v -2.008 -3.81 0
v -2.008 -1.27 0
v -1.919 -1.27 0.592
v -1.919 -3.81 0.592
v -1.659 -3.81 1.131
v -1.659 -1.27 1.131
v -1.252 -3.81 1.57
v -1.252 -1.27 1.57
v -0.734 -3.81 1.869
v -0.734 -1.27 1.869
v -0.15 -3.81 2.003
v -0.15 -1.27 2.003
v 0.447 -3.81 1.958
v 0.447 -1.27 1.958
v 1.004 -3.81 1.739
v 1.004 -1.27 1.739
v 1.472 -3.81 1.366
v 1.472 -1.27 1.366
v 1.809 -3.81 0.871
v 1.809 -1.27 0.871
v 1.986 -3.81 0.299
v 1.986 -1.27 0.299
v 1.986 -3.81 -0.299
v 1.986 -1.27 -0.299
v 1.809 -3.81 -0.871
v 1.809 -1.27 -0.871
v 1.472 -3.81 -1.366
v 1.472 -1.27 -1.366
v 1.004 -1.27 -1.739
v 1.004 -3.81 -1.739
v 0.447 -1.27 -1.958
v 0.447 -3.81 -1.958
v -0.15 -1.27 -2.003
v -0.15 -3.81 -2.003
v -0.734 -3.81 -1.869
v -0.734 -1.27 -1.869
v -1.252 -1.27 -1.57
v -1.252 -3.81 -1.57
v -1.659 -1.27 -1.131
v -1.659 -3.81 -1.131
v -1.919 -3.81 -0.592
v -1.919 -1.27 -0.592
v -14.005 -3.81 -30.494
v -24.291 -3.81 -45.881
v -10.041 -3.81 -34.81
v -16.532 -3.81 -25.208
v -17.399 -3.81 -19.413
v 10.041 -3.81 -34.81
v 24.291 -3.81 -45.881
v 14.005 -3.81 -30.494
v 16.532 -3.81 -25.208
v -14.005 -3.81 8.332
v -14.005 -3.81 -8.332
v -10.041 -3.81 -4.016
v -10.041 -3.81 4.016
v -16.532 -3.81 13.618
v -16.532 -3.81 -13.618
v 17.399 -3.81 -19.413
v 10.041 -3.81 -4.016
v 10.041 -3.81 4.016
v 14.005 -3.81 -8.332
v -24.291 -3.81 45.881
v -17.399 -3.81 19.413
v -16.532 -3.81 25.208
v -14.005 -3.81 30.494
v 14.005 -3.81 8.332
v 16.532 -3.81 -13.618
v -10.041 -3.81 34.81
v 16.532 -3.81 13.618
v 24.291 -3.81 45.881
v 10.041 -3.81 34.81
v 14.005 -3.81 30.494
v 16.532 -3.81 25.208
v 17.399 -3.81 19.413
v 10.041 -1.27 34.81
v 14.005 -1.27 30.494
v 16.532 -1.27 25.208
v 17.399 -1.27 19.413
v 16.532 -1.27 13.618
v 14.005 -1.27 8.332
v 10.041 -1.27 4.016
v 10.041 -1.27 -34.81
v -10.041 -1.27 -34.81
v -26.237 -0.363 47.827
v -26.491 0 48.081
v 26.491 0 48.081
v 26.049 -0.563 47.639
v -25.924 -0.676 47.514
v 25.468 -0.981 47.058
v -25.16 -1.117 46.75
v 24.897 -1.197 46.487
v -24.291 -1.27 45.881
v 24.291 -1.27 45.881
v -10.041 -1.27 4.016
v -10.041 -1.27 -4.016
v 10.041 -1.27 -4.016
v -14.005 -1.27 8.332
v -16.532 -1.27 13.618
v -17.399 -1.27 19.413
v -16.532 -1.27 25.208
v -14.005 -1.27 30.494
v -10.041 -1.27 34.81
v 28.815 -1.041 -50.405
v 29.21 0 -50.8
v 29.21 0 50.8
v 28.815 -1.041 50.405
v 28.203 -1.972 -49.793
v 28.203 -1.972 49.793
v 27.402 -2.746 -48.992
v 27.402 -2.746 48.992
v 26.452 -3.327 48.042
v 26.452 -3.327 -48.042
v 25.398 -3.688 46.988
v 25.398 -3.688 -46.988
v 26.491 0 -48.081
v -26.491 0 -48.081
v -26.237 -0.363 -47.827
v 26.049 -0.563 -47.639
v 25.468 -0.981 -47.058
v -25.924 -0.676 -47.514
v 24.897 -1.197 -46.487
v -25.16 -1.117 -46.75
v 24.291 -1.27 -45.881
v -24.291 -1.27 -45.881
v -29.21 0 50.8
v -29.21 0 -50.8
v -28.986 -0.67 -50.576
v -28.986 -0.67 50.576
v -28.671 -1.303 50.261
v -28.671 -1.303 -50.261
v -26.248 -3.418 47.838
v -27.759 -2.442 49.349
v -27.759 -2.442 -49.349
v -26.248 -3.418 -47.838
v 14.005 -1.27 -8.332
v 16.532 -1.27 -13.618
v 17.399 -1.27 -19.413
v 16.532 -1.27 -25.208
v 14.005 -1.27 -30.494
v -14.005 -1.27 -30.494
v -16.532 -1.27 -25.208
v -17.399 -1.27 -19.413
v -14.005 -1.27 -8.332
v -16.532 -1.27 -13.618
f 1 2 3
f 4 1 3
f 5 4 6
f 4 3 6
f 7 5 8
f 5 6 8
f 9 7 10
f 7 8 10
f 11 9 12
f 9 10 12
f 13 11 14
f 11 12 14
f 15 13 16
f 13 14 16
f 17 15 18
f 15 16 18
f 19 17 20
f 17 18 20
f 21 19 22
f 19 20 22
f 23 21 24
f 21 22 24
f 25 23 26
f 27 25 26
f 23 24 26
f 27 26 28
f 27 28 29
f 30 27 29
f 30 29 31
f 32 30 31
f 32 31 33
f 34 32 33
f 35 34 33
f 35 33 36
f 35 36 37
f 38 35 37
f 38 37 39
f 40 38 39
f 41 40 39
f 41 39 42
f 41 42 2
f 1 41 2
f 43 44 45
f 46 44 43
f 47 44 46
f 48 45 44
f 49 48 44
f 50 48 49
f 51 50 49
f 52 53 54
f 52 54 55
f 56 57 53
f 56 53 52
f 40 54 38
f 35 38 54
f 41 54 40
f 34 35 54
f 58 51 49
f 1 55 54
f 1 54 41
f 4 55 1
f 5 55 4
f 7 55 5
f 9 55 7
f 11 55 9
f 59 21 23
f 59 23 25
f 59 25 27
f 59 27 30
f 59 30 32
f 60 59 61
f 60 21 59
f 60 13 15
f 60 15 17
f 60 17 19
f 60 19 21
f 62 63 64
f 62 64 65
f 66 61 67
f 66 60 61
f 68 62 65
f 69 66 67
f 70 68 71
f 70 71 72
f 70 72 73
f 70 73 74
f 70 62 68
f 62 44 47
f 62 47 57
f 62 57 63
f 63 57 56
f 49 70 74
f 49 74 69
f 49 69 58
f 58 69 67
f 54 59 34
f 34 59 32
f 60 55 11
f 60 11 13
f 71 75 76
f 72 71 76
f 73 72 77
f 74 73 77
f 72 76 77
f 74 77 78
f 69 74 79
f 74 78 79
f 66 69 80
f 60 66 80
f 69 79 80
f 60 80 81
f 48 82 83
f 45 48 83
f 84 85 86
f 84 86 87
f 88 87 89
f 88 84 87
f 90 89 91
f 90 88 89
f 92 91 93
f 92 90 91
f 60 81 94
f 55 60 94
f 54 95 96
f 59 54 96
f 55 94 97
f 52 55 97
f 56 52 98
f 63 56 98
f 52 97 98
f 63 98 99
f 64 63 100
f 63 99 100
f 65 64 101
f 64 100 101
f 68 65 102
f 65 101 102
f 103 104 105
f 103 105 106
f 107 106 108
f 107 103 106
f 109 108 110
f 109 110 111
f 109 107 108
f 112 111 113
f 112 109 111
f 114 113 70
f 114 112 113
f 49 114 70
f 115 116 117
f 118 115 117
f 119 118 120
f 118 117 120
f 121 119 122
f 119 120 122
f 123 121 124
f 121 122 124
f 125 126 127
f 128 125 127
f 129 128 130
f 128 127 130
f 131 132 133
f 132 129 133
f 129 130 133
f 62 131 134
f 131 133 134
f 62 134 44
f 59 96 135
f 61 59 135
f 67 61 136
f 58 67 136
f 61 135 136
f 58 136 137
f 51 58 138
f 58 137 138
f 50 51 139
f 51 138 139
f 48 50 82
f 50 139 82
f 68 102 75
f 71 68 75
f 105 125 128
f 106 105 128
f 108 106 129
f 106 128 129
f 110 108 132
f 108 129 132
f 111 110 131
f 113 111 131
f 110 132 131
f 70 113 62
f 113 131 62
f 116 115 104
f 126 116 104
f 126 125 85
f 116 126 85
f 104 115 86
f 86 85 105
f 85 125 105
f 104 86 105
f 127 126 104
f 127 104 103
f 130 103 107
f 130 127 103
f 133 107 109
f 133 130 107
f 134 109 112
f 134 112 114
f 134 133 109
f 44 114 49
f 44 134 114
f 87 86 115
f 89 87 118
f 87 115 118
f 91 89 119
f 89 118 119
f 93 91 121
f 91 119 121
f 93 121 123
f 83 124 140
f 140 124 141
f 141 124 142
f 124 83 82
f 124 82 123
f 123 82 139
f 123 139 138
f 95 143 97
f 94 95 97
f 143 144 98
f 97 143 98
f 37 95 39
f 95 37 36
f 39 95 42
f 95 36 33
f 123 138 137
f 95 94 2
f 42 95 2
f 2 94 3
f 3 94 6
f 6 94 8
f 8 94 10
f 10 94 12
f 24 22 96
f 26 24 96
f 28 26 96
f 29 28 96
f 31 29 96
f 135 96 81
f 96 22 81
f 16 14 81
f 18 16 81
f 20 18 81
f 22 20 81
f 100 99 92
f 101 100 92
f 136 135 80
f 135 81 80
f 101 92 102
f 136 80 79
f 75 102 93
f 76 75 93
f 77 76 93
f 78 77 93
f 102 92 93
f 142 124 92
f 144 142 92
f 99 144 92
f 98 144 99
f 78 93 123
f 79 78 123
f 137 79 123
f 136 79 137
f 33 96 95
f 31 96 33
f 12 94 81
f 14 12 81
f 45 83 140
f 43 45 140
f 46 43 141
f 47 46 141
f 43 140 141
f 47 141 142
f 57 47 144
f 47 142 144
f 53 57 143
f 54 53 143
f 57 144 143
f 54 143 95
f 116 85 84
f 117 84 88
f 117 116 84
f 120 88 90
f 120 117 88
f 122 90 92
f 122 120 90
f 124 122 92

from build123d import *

# Parameters (mm, degrees)
F0_W        = 58.42
F0_H        = 101.6
F1_DEPTH    = 3.81
F2_T1_DEPTH = 126.1934442484
F2_T3_DEPTH = 83.0134442484
F4_T        = -2.54
F3_R        = 2.0082426315
F5_DEPTH    = 25.4


# Not quite as in the source:
# - a fillet or chamfer that OpenCascade refuses, or shapes differently, is made with other operations: its cross-section is extruded or revolved along the edge and cut away or added


with BuildPart() as f1:
    # F0 (on Front) → F1 (new body)
    with BuildSketch(Plane.XZ):
        Rectangle(F0_W, F0_H)
    extrude(amount=F1_DEPTH)

    # F2: fillet of radius 5.08 on 4 edges, made by hand

    # F2_s2 → F2_t1 (cut)
    with BuildSketch(Plane.XY.offset(-63.0967221242)):
        with BuildLine():
            ThreePointArc((-29.21, 0), (-27.4021631237, -2.7460926284), (-24.2913111503, -3.81))
            Line((-24.2913111503, -3.81), (-24.2913111503, -3.9116))
            Line((-24.2913111503, -3.9116), (-29.21, -3.9116))
            Line((-29.21, -3.9116), (-29.3116, -3.81))
            ThreePointArc((-29.3116, -3.81), (-29.3116, -1.905), (-29.308373777, -0.0254))
            Line((-29.308373777, -0.0254), (-29.21, 0))
        make_face()
        with BuildLine():
            ThreePointArc((29.21, 0), (27.4021631237, -2.7460926284), (24.2913111503, -3.81))
            Line((24.2913111503, -3.81), (24.2913111503, -3.9116))
            Line((24.2913111503, -3.9116), (29.21, -3.9116))
            Line((29.21, -3.9116), (29.3116, -3.81))
            ThreePointArc((29.3116, -3.81), (29.3116, -1.905), (29.308373777, -0.0254))
            Line((29.308373777, -0.0254), (29.21, 0))
        make_face()
    extrude(amount=F2_T1_DEPTH, mode=Mode.SUBTRACT)

    # F2_s4 → F2_t3 (cut)
    with BuildSketch(Plane.YZ.offset(-41.5067221242)):
        with BuildLine():
            ThreePointArc((0, 50.8), (-2.7460926284, 48.9921631237), (-3.81, 45.8813111503))
            Line((-3.81, 45.8813111503), (-3.9116, 45.8813111503))
            Line((-3.9116, 45.8813111503), (-3.9116, 50.8))
            Line((-3.9116, 50.8), (-3.81, 50.9016))
            ThreePointArc((-3.81, 50.9016), (-1.905, 50.9016), (-0.0254, 50.898373777))
            Line((-0.0254, 50.898373777), (0, 50.8))
        make_face()
        with BuildLine():
            ThreePointArc((0, -50.8), (-2.7460926284, -48.9921631237), (-3.81, -45.8813111503))
            Line((-3.81, -45.8813111503), (-3.9116, -45.8813111503))
            Line((-3.9116, -45.8813111503), (-3.9116, -50.8))
            Line((-3.9116, -50.8), (-3.81, -50.9016))
            ThreePointArc((-3.81, -50.9016), (-1.905, -50.9016), (-0.0254, -50.898373777))
            Line((-0.0254, -50.898373777), (0, -50.8))
        make_face()
    extrude(amount=F2_T3_DEPTH, mode=Mode.SUBTRACT)

    # F4
    f4_openings = [f1.faces().sort_by_distance(p)[0] for p in [
        (0, 0, 0),
    ]]
    offset(amount=F4_T, openings=f4_openings)

    # F3 (on face) → F5 (cut)
    with BuildSketch(Plane(origin=(0, 0, 0), x_dir=(-1, 0, 0), z_dir=(0, 1, 0))):
        with BuildLine():
            Line((10.0412131573, 34.8095389452), (-10.0412131573, 34.8095389452))
            ThreePointArc((-10.0412131573, 34.8095389452), (-17.399, 19.413012104), (-10.0412131573, 4.0164852629))
            Line((-10.0412131573, 4.0164852629), (10.0412131573, 4.0164852629))
            ThreePointArc((10.0412131573, 4.0164852629), (17.399, 19.413012104), (10.0412131573, 34.8095389452))
        make_face()
        with BuildLine():
            Line((10.0412131573, -4.0164852629), (-10.0412131573, -4.0164852629))
            ThreePointArc((-10.0412131573, -4.0164852629), (-17.399, -19.413012104), (-10.0412131573, -34.8095389452))
            Line((-10.0412131573, -34.8095389452), (10.0412131573, -34.8095389452))
            ThreePointArc((10.0412131573, -34.8095389452), (17.399, -19.413012104), (10.0412131573, -4.0164852629))
        make_face()
        Circle(F3_R)
    extrude(amount=-F5_DEPTH, mode=Mode.SUBTRACT)


solid = f1.part
